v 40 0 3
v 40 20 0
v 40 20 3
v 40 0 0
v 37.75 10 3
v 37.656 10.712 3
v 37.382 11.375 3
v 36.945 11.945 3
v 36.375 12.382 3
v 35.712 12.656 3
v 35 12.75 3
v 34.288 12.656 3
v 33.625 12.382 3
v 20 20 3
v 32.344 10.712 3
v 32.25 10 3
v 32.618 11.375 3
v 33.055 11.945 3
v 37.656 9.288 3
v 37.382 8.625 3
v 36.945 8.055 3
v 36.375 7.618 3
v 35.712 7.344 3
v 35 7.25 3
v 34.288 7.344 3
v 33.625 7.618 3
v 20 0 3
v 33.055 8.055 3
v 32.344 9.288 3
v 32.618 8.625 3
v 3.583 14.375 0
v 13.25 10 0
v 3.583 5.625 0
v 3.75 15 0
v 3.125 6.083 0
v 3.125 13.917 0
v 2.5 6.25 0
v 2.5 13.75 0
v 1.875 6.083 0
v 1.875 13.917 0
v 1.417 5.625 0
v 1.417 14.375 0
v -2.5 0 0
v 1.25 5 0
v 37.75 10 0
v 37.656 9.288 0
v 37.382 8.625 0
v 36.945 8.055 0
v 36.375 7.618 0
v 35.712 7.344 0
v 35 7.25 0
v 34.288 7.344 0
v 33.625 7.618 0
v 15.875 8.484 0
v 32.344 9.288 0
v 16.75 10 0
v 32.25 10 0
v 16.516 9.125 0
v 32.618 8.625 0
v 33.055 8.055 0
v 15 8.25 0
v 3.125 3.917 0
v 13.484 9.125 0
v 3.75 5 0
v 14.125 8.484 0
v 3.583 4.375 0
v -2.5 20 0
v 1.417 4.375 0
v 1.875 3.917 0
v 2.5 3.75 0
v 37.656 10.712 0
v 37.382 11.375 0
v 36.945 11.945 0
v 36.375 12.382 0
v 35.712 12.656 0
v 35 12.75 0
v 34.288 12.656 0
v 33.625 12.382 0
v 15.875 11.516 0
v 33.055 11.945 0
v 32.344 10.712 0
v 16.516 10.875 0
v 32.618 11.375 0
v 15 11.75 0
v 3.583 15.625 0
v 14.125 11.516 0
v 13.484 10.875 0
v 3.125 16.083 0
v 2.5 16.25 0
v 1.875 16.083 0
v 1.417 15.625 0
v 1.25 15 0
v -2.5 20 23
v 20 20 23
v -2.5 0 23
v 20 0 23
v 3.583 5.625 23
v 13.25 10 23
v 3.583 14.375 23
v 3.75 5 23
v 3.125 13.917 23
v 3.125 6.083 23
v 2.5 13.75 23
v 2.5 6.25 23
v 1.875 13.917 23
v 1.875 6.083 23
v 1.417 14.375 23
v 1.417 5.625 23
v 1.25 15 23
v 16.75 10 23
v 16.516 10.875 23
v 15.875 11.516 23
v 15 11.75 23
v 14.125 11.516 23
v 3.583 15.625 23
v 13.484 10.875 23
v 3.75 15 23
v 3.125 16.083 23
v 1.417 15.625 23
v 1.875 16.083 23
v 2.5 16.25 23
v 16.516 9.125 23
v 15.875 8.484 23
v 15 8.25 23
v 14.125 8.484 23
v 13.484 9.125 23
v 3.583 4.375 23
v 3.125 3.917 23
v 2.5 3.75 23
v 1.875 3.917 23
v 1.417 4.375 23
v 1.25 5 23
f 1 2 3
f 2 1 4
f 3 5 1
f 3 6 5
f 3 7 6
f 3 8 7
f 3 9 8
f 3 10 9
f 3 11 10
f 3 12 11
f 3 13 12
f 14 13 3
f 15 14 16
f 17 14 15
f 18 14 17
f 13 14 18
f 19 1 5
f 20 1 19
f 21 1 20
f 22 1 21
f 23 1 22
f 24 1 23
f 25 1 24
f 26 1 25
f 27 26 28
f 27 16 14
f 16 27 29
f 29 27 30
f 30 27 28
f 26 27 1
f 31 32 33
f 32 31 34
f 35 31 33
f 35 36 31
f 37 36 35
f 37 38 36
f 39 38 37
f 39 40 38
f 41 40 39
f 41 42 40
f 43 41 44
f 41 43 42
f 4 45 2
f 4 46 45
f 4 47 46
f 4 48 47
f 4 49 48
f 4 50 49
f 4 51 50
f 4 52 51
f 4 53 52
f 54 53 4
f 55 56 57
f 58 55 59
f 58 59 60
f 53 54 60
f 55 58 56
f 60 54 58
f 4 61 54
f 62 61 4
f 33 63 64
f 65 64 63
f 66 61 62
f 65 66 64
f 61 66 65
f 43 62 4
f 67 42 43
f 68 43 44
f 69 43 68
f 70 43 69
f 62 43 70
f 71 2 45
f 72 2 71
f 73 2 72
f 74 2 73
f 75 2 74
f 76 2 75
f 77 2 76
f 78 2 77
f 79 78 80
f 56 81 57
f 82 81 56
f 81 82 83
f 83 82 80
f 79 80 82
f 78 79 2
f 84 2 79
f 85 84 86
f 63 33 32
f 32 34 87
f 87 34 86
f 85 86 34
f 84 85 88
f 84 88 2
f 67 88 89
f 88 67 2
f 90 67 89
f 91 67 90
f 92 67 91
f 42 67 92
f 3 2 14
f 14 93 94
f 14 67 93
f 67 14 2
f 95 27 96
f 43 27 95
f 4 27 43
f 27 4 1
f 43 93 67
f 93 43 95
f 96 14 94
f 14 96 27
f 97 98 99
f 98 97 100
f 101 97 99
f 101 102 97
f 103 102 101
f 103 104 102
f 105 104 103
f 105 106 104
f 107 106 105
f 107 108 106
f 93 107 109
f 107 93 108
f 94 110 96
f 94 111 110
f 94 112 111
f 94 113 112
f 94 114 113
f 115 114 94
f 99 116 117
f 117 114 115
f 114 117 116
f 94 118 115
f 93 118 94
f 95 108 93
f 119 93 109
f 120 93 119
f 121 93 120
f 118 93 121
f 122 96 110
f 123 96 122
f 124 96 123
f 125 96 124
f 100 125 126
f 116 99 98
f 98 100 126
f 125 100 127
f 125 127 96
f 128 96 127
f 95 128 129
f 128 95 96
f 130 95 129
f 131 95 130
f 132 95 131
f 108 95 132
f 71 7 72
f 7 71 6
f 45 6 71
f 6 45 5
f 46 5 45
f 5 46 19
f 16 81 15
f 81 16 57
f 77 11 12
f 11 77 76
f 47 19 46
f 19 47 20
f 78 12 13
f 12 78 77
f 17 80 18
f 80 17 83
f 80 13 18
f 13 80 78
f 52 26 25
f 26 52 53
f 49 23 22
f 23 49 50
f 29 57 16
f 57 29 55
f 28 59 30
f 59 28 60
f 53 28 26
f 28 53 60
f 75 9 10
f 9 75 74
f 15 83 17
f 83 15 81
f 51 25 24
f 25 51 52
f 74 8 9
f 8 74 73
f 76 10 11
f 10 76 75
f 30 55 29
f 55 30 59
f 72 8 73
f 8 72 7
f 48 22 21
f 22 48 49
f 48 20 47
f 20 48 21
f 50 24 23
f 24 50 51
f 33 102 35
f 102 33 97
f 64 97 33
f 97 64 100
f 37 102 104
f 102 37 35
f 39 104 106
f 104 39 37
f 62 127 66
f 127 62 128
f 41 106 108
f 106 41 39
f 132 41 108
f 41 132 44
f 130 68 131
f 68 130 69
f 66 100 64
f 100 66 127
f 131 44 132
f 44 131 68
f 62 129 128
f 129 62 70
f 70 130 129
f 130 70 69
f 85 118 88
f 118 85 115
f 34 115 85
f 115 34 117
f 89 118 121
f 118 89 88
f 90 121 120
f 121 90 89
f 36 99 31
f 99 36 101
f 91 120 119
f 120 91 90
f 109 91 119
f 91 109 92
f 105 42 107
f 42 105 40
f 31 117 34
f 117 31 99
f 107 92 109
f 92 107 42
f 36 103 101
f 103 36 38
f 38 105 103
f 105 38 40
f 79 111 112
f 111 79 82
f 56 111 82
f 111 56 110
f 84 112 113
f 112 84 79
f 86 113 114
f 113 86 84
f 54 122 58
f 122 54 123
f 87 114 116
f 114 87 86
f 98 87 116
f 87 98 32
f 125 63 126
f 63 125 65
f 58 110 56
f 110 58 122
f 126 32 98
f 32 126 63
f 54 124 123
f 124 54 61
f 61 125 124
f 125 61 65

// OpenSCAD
difference()
{
    union()
    {
        cube([40,20,3]);
        
        translate([-2.5,0,0])
            cube([2.5,20,3]);
        
        translate([-2.5,0,0])
            cube([20+2.5,20,20+3]);
    }
    union()
    {
        translate([35,10,0])
            cylinder(d=5.5,h=3,$fn=24);
        
        translate([2.5,5,0])
            cylinder(d=2.5,h=30,$fn=12);
        translate([2.5,15,0])
            cylinder(d=2.5,h=30,$fn=12);
        
        translate([15,10,0])
            cylinder(d=3.5,h=30,$fn=12);
    }
}
